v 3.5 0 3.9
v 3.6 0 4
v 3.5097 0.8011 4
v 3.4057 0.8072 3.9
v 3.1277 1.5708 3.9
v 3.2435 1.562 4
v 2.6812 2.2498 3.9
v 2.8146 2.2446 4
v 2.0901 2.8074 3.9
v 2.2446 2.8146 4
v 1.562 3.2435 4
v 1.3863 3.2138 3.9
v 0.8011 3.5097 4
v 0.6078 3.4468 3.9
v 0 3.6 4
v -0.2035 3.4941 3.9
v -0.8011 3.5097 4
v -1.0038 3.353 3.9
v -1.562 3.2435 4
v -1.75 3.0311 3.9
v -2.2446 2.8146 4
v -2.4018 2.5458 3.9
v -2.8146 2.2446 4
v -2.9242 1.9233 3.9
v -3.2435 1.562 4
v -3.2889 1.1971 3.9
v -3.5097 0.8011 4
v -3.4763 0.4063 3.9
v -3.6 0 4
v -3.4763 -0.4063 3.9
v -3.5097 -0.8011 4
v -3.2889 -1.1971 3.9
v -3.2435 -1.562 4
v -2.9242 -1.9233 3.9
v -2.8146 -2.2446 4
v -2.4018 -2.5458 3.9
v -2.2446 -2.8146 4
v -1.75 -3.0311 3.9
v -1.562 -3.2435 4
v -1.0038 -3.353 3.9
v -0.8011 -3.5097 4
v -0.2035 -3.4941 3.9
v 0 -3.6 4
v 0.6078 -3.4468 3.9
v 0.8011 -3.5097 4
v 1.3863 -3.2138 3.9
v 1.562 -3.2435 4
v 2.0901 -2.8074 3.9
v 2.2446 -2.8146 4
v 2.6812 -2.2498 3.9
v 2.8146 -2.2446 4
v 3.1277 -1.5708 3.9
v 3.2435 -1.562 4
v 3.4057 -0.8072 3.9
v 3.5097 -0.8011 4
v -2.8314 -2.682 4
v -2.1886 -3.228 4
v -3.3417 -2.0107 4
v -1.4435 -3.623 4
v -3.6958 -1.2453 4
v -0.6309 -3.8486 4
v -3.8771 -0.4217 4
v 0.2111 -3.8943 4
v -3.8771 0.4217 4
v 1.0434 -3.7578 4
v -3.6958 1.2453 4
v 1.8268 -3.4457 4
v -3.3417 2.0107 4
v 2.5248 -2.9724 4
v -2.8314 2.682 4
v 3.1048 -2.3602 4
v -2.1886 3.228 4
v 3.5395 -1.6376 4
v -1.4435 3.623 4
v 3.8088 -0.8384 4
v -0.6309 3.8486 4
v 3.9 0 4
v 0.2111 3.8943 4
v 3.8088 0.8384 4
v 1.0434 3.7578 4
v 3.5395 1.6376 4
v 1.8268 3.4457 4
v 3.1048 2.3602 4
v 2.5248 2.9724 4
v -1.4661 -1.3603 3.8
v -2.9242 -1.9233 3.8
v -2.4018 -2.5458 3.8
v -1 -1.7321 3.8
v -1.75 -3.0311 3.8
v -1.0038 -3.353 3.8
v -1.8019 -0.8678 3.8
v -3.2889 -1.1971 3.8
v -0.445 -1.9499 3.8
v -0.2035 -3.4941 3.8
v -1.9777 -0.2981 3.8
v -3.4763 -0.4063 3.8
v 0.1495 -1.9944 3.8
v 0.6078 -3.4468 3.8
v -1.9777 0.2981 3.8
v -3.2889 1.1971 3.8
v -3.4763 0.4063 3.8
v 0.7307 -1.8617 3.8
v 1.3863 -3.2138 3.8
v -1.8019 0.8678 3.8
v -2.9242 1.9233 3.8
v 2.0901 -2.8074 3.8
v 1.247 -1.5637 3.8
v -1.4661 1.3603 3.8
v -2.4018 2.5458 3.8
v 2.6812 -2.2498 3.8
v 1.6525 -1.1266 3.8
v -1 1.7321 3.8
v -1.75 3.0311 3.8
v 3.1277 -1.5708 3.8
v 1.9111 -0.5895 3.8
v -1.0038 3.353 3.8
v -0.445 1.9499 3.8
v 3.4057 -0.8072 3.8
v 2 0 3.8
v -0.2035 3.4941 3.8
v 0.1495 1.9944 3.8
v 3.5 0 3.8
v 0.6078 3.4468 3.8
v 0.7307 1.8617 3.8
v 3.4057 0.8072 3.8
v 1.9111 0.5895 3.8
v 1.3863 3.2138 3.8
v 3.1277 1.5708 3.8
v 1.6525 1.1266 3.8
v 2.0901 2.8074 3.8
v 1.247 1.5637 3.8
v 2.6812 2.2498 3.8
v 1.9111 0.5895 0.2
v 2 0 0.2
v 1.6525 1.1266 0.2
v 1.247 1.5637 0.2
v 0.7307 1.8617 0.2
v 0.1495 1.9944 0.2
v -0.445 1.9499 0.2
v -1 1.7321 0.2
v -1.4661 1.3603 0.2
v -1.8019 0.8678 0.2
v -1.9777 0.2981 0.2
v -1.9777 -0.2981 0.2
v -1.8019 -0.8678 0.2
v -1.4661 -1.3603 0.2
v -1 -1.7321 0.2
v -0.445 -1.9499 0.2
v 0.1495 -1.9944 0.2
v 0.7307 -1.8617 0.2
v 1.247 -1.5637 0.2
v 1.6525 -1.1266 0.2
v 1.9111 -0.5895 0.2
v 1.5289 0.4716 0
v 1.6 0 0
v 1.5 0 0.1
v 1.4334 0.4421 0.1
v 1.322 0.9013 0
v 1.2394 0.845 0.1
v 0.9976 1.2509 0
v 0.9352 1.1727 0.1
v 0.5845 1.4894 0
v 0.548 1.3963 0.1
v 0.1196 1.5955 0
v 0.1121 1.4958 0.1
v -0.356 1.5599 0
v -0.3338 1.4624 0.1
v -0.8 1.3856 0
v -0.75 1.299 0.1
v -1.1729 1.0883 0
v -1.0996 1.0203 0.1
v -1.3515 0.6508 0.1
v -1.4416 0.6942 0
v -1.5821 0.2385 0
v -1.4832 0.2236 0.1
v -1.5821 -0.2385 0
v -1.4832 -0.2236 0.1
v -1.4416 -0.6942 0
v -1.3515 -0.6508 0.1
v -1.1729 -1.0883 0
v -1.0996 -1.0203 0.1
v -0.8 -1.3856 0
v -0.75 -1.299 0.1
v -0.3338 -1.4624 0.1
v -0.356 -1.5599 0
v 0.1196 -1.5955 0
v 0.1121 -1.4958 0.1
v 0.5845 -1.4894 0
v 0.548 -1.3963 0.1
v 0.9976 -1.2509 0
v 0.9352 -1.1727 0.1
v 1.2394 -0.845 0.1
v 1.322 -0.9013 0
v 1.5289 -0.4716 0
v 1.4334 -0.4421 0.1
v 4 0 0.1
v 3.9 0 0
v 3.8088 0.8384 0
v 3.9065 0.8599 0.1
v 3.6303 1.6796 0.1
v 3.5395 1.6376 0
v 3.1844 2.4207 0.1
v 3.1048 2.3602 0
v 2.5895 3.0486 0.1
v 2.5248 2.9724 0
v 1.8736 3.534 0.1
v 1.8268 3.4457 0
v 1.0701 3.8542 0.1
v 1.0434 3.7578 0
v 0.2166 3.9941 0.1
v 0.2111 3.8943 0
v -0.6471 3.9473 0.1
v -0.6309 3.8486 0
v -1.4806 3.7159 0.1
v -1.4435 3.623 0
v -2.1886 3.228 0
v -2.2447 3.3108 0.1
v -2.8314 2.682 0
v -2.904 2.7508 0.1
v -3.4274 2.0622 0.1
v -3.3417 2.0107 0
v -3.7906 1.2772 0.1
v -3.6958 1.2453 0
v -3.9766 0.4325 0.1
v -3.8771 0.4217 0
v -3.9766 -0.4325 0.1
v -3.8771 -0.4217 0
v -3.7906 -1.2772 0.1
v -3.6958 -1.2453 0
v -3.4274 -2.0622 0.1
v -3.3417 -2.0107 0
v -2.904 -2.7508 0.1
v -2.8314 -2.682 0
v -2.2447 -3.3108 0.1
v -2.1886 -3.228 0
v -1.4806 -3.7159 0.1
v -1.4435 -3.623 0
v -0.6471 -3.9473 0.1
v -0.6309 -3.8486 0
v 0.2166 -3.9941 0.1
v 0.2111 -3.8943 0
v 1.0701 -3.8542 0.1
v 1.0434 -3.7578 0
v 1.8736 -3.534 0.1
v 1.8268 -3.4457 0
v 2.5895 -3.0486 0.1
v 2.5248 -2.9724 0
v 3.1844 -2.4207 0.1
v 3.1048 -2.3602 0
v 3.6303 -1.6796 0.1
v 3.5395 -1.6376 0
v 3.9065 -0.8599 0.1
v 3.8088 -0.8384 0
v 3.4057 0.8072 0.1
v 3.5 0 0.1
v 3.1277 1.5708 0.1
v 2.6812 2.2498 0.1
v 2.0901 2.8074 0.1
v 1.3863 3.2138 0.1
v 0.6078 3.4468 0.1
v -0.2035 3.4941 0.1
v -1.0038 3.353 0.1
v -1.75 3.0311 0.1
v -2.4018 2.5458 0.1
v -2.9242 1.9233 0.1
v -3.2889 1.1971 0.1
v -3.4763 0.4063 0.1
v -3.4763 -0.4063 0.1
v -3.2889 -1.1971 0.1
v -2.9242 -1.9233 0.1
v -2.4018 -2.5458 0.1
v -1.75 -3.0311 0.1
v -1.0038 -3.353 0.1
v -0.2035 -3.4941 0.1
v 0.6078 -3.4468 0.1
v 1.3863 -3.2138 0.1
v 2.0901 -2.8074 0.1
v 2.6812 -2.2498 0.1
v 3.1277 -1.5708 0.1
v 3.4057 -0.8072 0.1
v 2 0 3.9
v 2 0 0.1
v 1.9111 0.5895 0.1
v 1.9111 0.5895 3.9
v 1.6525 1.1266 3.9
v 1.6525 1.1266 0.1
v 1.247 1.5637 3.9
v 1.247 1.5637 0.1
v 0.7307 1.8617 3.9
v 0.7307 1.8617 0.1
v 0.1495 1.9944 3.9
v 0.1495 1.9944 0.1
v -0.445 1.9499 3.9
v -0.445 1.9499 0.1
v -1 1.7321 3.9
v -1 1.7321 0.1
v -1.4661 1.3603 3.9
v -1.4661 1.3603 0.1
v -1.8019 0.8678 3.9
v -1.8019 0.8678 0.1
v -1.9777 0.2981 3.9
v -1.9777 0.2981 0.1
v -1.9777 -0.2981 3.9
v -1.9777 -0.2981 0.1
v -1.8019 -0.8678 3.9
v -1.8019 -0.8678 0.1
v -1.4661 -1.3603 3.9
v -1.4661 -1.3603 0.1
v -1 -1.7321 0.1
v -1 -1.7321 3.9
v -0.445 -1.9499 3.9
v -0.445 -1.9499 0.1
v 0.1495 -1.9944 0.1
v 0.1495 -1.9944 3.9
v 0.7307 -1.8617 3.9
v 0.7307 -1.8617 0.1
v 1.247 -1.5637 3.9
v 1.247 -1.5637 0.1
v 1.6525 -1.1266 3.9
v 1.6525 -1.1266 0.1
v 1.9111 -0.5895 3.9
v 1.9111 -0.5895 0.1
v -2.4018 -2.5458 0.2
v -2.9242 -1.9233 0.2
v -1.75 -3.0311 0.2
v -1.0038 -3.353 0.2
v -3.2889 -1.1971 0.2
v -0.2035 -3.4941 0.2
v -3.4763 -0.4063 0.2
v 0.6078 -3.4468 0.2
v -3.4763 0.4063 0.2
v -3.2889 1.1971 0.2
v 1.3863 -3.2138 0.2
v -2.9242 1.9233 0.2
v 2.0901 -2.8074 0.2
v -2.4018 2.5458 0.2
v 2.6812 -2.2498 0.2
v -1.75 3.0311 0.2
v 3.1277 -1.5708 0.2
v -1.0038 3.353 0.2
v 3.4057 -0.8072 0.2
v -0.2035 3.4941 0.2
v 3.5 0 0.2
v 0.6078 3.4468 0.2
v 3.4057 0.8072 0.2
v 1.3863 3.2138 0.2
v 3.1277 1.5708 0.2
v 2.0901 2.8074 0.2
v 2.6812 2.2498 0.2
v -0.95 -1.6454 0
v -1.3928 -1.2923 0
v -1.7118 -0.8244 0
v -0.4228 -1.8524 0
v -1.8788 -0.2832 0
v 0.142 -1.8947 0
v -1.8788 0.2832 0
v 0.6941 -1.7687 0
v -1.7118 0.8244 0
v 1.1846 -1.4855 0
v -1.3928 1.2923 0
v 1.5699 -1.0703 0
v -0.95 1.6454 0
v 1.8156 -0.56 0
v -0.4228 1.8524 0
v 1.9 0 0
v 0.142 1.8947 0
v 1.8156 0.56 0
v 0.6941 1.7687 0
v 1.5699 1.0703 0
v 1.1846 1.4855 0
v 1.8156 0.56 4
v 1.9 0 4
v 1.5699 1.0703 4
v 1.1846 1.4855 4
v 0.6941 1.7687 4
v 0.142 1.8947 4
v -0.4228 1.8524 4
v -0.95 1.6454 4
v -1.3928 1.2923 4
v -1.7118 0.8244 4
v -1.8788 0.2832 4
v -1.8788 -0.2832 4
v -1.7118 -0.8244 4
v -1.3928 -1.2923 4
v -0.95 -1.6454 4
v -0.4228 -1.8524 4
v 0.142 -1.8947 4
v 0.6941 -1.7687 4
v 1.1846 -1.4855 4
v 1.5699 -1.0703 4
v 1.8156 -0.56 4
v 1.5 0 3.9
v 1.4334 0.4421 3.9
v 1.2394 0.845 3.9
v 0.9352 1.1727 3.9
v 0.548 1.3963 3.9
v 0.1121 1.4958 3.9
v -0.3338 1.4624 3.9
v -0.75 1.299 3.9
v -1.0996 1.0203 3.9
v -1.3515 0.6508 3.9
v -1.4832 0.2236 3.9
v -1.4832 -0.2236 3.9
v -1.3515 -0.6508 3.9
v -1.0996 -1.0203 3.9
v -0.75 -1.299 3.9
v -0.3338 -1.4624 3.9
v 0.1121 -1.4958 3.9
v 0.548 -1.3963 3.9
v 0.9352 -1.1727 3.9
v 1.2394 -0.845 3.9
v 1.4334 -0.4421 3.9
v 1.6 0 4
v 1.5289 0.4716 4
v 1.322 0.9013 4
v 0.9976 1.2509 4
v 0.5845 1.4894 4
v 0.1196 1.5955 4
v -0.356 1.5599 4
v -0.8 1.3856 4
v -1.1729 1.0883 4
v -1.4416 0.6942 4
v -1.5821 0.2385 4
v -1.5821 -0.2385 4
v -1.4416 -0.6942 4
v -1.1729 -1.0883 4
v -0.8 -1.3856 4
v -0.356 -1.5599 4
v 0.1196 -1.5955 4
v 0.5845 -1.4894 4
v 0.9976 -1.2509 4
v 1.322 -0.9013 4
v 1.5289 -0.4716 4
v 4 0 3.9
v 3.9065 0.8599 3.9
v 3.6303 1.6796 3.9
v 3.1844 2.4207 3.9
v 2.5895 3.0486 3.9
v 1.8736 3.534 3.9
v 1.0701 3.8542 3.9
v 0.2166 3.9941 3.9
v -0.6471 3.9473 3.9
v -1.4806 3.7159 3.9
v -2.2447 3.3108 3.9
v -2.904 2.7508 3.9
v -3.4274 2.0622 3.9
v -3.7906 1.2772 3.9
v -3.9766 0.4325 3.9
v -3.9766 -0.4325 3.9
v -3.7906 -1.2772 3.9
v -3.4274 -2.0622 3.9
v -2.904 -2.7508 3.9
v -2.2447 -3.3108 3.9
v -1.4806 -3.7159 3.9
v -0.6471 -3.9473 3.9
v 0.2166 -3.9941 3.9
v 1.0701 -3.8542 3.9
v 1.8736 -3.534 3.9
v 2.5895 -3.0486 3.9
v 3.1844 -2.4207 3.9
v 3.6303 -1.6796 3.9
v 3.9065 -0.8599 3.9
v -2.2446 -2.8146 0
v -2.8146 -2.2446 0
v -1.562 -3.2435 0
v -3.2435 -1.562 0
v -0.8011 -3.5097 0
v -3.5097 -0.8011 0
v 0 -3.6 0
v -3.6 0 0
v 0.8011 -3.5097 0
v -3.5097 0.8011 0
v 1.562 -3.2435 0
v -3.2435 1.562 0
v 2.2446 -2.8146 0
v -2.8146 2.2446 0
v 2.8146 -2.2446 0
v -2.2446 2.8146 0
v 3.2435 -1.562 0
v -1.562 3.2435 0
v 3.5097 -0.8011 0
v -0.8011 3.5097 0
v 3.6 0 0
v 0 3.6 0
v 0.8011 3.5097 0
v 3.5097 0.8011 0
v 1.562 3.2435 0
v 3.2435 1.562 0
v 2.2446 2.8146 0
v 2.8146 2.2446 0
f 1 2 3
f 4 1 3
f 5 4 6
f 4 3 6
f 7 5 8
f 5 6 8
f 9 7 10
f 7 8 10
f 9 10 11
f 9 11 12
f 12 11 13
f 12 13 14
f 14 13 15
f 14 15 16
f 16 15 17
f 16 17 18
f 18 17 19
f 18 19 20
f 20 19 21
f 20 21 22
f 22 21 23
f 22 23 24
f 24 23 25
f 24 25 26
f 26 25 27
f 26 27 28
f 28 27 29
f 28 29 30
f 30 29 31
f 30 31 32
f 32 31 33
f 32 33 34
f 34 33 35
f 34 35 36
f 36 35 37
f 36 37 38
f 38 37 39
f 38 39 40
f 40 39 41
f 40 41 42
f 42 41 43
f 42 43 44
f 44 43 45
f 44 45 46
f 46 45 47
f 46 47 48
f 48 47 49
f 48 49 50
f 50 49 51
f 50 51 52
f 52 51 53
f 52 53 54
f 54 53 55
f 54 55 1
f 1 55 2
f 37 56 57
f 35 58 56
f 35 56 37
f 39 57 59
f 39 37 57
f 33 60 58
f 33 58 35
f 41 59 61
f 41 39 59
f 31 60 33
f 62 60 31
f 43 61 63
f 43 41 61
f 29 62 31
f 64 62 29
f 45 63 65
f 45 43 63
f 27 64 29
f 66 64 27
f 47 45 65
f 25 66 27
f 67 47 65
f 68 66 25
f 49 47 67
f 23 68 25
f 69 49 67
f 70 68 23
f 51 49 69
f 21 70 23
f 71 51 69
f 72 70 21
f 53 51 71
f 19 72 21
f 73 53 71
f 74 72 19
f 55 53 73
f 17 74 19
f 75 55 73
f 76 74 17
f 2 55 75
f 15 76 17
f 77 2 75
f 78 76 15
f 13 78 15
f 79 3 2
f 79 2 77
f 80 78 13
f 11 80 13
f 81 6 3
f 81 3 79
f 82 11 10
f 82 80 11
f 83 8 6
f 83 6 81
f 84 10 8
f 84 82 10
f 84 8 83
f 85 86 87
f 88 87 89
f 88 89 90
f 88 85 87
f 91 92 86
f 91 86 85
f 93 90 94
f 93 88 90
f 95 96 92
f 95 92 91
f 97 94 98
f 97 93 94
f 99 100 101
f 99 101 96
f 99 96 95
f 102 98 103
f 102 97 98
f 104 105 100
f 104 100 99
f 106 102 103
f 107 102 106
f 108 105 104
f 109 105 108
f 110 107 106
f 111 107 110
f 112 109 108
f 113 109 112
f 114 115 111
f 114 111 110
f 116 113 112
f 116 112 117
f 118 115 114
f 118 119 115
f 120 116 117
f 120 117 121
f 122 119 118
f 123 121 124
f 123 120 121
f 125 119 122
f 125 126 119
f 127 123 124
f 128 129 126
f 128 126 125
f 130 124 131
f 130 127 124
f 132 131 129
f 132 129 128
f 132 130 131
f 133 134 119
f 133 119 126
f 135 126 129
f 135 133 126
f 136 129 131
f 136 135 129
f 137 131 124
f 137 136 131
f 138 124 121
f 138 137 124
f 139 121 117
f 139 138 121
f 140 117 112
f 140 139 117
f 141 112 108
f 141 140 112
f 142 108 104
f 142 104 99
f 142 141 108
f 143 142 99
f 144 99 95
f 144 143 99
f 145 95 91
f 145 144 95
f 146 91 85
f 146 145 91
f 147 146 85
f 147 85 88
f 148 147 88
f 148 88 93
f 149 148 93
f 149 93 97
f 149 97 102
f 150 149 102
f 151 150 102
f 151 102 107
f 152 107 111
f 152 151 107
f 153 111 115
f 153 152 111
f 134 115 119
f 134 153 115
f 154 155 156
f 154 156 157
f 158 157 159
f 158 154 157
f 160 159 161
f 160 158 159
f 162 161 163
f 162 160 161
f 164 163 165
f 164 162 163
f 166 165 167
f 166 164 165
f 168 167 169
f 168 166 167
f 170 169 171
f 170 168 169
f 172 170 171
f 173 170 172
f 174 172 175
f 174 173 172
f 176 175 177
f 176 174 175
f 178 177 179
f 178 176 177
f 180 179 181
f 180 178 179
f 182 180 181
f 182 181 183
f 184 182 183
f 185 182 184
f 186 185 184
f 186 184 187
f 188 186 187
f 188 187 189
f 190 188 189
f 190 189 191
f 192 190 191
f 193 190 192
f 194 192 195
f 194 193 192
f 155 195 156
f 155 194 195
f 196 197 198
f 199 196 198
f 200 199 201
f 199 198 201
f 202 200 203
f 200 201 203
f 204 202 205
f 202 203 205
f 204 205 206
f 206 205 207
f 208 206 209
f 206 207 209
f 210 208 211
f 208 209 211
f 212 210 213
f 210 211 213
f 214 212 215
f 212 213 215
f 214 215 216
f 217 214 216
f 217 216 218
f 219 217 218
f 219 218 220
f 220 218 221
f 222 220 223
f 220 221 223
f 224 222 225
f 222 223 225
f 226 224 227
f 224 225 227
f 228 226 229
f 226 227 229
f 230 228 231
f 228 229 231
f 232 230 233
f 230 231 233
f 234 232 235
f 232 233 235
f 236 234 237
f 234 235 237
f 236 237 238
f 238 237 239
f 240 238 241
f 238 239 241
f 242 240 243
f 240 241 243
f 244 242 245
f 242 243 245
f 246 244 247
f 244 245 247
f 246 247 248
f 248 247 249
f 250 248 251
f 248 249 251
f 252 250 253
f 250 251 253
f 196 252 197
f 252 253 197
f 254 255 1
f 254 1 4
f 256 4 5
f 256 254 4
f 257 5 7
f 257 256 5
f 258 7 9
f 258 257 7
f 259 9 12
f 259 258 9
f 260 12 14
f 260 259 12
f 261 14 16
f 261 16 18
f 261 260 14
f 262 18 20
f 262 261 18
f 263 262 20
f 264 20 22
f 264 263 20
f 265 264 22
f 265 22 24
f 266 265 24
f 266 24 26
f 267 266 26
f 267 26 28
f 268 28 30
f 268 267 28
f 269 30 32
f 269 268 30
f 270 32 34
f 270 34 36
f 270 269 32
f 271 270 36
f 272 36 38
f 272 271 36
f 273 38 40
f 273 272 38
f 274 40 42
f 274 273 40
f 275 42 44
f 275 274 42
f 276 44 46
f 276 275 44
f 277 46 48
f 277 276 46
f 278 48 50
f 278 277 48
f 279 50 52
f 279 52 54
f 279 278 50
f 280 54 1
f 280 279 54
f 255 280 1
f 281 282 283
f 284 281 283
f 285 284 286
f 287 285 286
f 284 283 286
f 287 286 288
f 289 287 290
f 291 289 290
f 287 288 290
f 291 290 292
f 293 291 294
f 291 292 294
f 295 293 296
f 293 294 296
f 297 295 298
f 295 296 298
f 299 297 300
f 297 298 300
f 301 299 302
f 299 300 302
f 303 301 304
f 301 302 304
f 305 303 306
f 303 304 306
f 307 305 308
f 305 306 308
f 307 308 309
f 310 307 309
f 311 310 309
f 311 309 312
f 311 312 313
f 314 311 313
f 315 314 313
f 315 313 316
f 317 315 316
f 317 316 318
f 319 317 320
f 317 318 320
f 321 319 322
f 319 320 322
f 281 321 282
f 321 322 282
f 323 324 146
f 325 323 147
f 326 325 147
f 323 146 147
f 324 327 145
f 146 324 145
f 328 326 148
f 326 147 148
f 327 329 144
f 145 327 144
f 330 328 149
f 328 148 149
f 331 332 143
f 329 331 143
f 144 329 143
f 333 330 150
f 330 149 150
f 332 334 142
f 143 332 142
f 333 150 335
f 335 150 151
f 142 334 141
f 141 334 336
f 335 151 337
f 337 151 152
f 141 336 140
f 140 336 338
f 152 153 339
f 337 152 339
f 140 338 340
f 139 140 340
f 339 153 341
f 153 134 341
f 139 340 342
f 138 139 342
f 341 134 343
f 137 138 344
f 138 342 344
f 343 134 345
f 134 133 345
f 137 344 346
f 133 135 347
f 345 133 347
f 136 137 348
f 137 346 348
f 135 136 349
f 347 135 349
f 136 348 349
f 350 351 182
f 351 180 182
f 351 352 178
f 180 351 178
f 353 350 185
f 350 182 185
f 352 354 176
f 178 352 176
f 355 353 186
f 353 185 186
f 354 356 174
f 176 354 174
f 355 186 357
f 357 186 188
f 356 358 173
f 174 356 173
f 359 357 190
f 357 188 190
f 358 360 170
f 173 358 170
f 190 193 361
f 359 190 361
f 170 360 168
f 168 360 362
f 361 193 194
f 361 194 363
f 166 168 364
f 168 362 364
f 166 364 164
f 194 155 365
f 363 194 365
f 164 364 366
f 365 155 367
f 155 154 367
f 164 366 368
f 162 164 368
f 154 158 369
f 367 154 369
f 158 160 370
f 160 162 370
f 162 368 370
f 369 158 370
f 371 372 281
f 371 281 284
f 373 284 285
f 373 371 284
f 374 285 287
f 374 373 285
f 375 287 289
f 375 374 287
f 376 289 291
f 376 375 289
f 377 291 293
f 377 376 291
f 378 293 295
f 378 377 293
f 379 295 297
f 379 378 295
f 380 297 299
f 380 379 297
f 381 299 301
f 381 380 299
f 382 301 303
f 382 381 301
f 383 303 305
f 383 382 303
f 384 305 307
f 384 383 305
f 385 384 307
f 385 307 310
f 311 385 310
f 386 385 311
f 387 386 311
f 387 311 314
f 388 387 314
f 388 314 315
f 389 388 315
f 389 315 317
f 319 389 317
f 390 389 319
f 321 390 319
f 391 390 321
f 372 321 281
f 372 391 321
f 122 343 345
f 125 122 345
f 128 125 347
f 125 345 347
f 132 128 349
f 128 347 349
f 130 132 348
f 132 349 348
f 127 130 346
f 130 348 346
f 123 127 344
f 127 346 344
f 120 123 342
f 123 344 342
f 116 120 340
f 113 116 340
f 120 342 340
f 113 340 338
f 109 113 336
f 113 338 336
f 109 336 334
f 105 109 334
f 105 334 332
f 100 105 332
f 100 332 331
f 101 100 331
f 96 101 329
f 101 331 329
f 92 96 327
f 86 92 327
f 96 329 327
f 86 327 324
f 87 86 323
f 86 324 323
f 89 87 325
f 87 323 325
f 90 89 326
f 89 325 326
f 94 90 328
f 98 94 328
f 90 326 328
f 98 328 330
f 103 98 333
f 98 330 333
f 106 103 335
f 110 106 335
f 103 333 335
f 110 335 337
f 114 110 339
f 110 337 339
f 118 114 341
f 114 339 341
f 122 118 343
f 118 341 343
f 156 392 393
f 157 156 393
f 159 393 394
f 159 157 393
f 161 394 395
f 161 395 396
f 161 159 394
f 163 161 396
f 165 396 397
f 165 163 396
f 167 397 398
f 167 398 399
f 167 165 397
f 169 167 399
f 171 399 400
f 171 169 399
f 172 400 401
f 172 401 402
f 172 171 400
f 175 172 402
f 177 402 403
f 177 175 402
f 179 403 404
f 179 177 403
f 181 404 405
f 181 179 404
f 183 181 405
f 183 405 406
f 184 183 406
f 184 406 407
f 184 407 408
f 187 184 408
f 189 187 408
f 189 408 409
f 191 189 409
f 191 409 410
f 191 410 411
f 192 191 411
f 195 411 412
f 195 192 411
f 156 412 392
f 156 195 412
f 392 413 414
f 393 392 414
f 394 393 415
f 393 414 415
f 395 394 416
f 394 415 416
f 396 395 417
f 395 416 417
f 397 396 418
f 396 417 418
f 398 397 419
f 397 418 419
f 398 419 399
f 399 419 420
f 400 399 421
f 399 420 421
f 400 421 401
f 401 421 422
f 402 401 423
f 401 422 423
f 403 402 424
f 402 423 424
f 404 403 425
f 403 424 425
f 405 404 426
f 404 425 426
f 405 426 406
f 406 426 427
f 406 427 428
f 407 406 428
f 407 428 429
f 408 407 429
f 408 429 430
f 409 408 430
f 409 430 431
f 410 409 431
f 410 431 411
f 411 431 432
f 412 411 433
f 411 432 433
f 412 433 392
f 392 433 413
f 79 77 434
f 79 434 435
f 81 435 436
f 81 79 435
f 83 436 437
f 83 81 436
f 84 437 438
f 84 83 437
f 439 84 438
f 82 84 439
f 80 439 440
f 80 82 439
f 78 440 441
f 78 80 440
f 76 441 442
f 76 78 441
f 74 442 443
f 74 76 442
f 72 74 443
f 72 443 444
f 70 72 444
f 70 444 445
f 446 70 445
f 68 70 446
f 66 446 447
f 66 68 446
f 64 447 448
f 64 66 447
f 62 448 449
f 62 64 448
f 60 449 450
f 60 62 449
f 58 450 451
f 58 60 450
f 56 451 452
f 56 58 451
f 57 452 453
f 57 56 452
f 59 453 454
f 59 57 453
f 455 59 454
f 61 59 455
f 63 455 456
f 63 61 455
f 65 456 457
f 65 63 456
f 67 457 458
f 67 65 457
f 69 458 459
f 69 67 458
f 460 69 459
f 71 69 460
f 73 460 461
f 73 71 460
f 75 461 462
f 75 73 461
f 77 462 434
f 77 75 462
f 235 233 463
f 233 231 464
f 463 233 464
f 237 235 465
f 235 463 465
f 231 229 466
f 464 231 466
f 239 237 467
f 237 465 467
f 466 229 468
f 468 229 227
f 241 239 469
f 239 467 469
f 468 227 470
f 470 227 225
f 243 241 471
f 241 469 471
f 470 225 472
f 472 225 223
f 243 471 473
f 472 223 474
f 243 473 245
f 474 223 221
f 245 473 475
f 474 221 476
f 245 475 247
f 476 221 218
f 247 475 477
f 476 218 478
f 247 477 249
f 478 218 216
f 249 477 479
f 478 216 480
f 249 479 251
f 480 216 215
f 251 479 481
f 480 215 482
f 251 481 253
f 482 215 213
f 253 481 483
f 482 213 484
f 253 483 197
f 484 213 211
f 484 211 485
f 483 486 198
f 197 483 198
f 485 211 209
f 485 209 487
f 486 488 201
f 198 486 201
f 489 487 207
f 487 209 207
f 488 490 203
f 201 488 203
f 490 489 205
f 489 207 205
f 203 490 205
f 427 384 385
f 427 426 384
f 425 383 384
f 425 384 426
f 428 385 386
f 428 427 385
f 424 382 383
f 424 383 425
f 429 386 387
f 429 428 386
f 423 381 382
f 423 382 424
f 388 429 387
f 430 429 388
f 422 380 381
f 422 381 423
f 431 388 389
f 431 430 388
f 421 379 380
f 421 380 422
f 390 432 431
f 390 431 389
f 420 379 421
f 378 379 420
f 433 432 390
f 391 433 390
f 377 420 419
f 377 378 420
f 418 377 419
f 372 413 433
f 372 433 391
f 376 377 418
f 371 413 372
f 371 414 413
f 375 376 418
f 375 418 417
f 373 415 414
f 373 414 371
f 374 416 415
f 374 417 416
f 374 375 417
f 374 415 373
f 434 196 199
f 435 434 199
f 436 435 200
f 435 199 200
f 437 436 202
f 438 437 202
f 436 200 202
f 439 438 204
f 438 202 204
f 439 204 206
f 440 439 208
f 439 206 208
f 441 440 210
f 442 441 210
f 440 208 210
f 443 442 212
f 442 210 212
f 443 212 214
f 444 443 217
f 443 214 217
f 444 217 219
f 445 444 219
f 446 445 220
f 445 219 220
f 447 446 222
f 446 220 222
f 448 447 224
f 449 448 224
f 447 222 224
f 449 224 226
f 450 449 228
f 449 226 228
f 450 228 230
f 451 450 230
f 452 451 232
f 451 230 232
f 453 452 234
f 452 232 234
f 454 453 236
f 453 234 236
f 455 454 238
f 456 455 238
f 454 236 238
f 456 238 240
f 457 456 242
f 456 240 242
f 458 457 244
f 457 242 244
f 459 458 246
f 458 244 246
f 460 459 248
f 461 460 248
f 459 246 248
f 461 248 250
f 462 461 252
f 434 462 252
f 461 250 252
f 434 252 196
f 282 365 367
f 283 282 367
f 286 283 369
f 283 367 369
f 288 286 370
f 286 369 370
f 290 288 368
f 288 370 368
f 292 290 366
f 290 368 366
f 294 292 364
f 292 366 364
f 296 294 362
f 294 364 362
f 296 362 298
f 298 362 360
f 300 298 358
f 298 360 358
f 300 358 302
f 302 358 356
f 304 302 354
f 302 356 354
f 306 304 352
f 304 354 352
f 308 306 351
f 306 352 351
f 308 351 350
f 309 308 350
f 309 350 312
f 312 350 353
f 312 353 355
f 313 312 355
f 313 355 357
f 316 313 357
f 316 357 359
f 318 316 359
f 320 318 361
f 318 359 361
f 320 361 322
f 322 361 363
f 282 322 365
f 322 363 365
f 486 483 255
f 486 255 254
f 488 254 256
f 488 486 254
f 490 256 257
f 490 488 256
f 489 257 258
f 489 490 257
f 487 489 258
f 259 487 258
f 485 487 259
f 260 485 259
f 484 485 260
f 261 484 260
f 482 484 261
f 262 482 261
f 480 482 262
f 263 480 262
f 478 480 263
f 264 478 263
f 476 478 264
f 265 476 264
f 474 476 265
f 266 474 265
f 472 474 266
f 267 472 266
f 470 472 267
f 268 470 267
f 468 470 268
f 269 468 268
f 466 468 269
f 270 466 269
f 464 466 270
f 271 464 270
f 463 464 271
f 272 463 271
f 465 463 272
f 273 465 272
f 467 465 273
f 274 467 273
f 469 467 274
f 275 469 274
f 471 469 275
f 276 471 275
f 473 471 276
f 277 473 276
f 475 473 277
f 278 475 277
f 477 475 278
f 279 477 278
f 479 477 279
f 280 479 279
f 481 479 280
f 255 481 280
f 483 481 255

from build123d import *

# Parameters (mm, degrees)
F0_R      = 2
F0_R_2    = 1.5
F1_DEPTH  = 4
F0_R_3    = 4
F0_R_4    = 3.5
F2_START  = 0.2
F2_DEPTH  = 3.6
F3_SIZE   = 0.1
F3_2_SIZE = 0.1


with BuildPart() as f1:
    # F0 (on Top) → F1 (new body)
    with BuildSketch(Plane.XY):
        Circle(F0_R)
        Circle(F0_R_2, mode=Mode.SUBTRACT)
    extrude(amount=F1_DEPTH)

    # F3
    f3_edges = [f1.edges().sort_by_distance(p)[0] for p in [
        (-2, 0, 0),
        (-1.5, 0, 0),
        (-2, 0, 4),
        (-1.5, 0, 4),
    ]]
    chamfer(f3_edges, length=F3_SIZE)


with BuildPart() as f1b:
    # F0 (on Top) → F1, piece 2 (new body)
    with BuildSketch(Plane.XY):
        Circle(F0_R_3)
        Circle(F0_R_4, mode=Mode.SUBTRACT)
    extrude(amount=F1_DEPTH)

    # F3#2
    f3_2_edges = [f1b.edges().sort_by_distance(p)[0] for p in [
        (-4, 0, 4),
        (-3.5, 0, 4),
        (-4, 0, 0),
        (-3.5, 0, 0),
    ]]
    chamfer(f3_2_edges, length=F3_2_SIZE)


with BuildPart() as f2:
    # F0 (on Top) → F2 (new body)
    with BuildSketch(Plane.XY.offset(F2_START)):
        Circle(F0_R_4)
        Circle(F0_R, mode=Mode.SUBTRACT)
    extrude(amount=F2_DEPTH)


solid = Compound([f1.part, f1b.part, f2.part])
